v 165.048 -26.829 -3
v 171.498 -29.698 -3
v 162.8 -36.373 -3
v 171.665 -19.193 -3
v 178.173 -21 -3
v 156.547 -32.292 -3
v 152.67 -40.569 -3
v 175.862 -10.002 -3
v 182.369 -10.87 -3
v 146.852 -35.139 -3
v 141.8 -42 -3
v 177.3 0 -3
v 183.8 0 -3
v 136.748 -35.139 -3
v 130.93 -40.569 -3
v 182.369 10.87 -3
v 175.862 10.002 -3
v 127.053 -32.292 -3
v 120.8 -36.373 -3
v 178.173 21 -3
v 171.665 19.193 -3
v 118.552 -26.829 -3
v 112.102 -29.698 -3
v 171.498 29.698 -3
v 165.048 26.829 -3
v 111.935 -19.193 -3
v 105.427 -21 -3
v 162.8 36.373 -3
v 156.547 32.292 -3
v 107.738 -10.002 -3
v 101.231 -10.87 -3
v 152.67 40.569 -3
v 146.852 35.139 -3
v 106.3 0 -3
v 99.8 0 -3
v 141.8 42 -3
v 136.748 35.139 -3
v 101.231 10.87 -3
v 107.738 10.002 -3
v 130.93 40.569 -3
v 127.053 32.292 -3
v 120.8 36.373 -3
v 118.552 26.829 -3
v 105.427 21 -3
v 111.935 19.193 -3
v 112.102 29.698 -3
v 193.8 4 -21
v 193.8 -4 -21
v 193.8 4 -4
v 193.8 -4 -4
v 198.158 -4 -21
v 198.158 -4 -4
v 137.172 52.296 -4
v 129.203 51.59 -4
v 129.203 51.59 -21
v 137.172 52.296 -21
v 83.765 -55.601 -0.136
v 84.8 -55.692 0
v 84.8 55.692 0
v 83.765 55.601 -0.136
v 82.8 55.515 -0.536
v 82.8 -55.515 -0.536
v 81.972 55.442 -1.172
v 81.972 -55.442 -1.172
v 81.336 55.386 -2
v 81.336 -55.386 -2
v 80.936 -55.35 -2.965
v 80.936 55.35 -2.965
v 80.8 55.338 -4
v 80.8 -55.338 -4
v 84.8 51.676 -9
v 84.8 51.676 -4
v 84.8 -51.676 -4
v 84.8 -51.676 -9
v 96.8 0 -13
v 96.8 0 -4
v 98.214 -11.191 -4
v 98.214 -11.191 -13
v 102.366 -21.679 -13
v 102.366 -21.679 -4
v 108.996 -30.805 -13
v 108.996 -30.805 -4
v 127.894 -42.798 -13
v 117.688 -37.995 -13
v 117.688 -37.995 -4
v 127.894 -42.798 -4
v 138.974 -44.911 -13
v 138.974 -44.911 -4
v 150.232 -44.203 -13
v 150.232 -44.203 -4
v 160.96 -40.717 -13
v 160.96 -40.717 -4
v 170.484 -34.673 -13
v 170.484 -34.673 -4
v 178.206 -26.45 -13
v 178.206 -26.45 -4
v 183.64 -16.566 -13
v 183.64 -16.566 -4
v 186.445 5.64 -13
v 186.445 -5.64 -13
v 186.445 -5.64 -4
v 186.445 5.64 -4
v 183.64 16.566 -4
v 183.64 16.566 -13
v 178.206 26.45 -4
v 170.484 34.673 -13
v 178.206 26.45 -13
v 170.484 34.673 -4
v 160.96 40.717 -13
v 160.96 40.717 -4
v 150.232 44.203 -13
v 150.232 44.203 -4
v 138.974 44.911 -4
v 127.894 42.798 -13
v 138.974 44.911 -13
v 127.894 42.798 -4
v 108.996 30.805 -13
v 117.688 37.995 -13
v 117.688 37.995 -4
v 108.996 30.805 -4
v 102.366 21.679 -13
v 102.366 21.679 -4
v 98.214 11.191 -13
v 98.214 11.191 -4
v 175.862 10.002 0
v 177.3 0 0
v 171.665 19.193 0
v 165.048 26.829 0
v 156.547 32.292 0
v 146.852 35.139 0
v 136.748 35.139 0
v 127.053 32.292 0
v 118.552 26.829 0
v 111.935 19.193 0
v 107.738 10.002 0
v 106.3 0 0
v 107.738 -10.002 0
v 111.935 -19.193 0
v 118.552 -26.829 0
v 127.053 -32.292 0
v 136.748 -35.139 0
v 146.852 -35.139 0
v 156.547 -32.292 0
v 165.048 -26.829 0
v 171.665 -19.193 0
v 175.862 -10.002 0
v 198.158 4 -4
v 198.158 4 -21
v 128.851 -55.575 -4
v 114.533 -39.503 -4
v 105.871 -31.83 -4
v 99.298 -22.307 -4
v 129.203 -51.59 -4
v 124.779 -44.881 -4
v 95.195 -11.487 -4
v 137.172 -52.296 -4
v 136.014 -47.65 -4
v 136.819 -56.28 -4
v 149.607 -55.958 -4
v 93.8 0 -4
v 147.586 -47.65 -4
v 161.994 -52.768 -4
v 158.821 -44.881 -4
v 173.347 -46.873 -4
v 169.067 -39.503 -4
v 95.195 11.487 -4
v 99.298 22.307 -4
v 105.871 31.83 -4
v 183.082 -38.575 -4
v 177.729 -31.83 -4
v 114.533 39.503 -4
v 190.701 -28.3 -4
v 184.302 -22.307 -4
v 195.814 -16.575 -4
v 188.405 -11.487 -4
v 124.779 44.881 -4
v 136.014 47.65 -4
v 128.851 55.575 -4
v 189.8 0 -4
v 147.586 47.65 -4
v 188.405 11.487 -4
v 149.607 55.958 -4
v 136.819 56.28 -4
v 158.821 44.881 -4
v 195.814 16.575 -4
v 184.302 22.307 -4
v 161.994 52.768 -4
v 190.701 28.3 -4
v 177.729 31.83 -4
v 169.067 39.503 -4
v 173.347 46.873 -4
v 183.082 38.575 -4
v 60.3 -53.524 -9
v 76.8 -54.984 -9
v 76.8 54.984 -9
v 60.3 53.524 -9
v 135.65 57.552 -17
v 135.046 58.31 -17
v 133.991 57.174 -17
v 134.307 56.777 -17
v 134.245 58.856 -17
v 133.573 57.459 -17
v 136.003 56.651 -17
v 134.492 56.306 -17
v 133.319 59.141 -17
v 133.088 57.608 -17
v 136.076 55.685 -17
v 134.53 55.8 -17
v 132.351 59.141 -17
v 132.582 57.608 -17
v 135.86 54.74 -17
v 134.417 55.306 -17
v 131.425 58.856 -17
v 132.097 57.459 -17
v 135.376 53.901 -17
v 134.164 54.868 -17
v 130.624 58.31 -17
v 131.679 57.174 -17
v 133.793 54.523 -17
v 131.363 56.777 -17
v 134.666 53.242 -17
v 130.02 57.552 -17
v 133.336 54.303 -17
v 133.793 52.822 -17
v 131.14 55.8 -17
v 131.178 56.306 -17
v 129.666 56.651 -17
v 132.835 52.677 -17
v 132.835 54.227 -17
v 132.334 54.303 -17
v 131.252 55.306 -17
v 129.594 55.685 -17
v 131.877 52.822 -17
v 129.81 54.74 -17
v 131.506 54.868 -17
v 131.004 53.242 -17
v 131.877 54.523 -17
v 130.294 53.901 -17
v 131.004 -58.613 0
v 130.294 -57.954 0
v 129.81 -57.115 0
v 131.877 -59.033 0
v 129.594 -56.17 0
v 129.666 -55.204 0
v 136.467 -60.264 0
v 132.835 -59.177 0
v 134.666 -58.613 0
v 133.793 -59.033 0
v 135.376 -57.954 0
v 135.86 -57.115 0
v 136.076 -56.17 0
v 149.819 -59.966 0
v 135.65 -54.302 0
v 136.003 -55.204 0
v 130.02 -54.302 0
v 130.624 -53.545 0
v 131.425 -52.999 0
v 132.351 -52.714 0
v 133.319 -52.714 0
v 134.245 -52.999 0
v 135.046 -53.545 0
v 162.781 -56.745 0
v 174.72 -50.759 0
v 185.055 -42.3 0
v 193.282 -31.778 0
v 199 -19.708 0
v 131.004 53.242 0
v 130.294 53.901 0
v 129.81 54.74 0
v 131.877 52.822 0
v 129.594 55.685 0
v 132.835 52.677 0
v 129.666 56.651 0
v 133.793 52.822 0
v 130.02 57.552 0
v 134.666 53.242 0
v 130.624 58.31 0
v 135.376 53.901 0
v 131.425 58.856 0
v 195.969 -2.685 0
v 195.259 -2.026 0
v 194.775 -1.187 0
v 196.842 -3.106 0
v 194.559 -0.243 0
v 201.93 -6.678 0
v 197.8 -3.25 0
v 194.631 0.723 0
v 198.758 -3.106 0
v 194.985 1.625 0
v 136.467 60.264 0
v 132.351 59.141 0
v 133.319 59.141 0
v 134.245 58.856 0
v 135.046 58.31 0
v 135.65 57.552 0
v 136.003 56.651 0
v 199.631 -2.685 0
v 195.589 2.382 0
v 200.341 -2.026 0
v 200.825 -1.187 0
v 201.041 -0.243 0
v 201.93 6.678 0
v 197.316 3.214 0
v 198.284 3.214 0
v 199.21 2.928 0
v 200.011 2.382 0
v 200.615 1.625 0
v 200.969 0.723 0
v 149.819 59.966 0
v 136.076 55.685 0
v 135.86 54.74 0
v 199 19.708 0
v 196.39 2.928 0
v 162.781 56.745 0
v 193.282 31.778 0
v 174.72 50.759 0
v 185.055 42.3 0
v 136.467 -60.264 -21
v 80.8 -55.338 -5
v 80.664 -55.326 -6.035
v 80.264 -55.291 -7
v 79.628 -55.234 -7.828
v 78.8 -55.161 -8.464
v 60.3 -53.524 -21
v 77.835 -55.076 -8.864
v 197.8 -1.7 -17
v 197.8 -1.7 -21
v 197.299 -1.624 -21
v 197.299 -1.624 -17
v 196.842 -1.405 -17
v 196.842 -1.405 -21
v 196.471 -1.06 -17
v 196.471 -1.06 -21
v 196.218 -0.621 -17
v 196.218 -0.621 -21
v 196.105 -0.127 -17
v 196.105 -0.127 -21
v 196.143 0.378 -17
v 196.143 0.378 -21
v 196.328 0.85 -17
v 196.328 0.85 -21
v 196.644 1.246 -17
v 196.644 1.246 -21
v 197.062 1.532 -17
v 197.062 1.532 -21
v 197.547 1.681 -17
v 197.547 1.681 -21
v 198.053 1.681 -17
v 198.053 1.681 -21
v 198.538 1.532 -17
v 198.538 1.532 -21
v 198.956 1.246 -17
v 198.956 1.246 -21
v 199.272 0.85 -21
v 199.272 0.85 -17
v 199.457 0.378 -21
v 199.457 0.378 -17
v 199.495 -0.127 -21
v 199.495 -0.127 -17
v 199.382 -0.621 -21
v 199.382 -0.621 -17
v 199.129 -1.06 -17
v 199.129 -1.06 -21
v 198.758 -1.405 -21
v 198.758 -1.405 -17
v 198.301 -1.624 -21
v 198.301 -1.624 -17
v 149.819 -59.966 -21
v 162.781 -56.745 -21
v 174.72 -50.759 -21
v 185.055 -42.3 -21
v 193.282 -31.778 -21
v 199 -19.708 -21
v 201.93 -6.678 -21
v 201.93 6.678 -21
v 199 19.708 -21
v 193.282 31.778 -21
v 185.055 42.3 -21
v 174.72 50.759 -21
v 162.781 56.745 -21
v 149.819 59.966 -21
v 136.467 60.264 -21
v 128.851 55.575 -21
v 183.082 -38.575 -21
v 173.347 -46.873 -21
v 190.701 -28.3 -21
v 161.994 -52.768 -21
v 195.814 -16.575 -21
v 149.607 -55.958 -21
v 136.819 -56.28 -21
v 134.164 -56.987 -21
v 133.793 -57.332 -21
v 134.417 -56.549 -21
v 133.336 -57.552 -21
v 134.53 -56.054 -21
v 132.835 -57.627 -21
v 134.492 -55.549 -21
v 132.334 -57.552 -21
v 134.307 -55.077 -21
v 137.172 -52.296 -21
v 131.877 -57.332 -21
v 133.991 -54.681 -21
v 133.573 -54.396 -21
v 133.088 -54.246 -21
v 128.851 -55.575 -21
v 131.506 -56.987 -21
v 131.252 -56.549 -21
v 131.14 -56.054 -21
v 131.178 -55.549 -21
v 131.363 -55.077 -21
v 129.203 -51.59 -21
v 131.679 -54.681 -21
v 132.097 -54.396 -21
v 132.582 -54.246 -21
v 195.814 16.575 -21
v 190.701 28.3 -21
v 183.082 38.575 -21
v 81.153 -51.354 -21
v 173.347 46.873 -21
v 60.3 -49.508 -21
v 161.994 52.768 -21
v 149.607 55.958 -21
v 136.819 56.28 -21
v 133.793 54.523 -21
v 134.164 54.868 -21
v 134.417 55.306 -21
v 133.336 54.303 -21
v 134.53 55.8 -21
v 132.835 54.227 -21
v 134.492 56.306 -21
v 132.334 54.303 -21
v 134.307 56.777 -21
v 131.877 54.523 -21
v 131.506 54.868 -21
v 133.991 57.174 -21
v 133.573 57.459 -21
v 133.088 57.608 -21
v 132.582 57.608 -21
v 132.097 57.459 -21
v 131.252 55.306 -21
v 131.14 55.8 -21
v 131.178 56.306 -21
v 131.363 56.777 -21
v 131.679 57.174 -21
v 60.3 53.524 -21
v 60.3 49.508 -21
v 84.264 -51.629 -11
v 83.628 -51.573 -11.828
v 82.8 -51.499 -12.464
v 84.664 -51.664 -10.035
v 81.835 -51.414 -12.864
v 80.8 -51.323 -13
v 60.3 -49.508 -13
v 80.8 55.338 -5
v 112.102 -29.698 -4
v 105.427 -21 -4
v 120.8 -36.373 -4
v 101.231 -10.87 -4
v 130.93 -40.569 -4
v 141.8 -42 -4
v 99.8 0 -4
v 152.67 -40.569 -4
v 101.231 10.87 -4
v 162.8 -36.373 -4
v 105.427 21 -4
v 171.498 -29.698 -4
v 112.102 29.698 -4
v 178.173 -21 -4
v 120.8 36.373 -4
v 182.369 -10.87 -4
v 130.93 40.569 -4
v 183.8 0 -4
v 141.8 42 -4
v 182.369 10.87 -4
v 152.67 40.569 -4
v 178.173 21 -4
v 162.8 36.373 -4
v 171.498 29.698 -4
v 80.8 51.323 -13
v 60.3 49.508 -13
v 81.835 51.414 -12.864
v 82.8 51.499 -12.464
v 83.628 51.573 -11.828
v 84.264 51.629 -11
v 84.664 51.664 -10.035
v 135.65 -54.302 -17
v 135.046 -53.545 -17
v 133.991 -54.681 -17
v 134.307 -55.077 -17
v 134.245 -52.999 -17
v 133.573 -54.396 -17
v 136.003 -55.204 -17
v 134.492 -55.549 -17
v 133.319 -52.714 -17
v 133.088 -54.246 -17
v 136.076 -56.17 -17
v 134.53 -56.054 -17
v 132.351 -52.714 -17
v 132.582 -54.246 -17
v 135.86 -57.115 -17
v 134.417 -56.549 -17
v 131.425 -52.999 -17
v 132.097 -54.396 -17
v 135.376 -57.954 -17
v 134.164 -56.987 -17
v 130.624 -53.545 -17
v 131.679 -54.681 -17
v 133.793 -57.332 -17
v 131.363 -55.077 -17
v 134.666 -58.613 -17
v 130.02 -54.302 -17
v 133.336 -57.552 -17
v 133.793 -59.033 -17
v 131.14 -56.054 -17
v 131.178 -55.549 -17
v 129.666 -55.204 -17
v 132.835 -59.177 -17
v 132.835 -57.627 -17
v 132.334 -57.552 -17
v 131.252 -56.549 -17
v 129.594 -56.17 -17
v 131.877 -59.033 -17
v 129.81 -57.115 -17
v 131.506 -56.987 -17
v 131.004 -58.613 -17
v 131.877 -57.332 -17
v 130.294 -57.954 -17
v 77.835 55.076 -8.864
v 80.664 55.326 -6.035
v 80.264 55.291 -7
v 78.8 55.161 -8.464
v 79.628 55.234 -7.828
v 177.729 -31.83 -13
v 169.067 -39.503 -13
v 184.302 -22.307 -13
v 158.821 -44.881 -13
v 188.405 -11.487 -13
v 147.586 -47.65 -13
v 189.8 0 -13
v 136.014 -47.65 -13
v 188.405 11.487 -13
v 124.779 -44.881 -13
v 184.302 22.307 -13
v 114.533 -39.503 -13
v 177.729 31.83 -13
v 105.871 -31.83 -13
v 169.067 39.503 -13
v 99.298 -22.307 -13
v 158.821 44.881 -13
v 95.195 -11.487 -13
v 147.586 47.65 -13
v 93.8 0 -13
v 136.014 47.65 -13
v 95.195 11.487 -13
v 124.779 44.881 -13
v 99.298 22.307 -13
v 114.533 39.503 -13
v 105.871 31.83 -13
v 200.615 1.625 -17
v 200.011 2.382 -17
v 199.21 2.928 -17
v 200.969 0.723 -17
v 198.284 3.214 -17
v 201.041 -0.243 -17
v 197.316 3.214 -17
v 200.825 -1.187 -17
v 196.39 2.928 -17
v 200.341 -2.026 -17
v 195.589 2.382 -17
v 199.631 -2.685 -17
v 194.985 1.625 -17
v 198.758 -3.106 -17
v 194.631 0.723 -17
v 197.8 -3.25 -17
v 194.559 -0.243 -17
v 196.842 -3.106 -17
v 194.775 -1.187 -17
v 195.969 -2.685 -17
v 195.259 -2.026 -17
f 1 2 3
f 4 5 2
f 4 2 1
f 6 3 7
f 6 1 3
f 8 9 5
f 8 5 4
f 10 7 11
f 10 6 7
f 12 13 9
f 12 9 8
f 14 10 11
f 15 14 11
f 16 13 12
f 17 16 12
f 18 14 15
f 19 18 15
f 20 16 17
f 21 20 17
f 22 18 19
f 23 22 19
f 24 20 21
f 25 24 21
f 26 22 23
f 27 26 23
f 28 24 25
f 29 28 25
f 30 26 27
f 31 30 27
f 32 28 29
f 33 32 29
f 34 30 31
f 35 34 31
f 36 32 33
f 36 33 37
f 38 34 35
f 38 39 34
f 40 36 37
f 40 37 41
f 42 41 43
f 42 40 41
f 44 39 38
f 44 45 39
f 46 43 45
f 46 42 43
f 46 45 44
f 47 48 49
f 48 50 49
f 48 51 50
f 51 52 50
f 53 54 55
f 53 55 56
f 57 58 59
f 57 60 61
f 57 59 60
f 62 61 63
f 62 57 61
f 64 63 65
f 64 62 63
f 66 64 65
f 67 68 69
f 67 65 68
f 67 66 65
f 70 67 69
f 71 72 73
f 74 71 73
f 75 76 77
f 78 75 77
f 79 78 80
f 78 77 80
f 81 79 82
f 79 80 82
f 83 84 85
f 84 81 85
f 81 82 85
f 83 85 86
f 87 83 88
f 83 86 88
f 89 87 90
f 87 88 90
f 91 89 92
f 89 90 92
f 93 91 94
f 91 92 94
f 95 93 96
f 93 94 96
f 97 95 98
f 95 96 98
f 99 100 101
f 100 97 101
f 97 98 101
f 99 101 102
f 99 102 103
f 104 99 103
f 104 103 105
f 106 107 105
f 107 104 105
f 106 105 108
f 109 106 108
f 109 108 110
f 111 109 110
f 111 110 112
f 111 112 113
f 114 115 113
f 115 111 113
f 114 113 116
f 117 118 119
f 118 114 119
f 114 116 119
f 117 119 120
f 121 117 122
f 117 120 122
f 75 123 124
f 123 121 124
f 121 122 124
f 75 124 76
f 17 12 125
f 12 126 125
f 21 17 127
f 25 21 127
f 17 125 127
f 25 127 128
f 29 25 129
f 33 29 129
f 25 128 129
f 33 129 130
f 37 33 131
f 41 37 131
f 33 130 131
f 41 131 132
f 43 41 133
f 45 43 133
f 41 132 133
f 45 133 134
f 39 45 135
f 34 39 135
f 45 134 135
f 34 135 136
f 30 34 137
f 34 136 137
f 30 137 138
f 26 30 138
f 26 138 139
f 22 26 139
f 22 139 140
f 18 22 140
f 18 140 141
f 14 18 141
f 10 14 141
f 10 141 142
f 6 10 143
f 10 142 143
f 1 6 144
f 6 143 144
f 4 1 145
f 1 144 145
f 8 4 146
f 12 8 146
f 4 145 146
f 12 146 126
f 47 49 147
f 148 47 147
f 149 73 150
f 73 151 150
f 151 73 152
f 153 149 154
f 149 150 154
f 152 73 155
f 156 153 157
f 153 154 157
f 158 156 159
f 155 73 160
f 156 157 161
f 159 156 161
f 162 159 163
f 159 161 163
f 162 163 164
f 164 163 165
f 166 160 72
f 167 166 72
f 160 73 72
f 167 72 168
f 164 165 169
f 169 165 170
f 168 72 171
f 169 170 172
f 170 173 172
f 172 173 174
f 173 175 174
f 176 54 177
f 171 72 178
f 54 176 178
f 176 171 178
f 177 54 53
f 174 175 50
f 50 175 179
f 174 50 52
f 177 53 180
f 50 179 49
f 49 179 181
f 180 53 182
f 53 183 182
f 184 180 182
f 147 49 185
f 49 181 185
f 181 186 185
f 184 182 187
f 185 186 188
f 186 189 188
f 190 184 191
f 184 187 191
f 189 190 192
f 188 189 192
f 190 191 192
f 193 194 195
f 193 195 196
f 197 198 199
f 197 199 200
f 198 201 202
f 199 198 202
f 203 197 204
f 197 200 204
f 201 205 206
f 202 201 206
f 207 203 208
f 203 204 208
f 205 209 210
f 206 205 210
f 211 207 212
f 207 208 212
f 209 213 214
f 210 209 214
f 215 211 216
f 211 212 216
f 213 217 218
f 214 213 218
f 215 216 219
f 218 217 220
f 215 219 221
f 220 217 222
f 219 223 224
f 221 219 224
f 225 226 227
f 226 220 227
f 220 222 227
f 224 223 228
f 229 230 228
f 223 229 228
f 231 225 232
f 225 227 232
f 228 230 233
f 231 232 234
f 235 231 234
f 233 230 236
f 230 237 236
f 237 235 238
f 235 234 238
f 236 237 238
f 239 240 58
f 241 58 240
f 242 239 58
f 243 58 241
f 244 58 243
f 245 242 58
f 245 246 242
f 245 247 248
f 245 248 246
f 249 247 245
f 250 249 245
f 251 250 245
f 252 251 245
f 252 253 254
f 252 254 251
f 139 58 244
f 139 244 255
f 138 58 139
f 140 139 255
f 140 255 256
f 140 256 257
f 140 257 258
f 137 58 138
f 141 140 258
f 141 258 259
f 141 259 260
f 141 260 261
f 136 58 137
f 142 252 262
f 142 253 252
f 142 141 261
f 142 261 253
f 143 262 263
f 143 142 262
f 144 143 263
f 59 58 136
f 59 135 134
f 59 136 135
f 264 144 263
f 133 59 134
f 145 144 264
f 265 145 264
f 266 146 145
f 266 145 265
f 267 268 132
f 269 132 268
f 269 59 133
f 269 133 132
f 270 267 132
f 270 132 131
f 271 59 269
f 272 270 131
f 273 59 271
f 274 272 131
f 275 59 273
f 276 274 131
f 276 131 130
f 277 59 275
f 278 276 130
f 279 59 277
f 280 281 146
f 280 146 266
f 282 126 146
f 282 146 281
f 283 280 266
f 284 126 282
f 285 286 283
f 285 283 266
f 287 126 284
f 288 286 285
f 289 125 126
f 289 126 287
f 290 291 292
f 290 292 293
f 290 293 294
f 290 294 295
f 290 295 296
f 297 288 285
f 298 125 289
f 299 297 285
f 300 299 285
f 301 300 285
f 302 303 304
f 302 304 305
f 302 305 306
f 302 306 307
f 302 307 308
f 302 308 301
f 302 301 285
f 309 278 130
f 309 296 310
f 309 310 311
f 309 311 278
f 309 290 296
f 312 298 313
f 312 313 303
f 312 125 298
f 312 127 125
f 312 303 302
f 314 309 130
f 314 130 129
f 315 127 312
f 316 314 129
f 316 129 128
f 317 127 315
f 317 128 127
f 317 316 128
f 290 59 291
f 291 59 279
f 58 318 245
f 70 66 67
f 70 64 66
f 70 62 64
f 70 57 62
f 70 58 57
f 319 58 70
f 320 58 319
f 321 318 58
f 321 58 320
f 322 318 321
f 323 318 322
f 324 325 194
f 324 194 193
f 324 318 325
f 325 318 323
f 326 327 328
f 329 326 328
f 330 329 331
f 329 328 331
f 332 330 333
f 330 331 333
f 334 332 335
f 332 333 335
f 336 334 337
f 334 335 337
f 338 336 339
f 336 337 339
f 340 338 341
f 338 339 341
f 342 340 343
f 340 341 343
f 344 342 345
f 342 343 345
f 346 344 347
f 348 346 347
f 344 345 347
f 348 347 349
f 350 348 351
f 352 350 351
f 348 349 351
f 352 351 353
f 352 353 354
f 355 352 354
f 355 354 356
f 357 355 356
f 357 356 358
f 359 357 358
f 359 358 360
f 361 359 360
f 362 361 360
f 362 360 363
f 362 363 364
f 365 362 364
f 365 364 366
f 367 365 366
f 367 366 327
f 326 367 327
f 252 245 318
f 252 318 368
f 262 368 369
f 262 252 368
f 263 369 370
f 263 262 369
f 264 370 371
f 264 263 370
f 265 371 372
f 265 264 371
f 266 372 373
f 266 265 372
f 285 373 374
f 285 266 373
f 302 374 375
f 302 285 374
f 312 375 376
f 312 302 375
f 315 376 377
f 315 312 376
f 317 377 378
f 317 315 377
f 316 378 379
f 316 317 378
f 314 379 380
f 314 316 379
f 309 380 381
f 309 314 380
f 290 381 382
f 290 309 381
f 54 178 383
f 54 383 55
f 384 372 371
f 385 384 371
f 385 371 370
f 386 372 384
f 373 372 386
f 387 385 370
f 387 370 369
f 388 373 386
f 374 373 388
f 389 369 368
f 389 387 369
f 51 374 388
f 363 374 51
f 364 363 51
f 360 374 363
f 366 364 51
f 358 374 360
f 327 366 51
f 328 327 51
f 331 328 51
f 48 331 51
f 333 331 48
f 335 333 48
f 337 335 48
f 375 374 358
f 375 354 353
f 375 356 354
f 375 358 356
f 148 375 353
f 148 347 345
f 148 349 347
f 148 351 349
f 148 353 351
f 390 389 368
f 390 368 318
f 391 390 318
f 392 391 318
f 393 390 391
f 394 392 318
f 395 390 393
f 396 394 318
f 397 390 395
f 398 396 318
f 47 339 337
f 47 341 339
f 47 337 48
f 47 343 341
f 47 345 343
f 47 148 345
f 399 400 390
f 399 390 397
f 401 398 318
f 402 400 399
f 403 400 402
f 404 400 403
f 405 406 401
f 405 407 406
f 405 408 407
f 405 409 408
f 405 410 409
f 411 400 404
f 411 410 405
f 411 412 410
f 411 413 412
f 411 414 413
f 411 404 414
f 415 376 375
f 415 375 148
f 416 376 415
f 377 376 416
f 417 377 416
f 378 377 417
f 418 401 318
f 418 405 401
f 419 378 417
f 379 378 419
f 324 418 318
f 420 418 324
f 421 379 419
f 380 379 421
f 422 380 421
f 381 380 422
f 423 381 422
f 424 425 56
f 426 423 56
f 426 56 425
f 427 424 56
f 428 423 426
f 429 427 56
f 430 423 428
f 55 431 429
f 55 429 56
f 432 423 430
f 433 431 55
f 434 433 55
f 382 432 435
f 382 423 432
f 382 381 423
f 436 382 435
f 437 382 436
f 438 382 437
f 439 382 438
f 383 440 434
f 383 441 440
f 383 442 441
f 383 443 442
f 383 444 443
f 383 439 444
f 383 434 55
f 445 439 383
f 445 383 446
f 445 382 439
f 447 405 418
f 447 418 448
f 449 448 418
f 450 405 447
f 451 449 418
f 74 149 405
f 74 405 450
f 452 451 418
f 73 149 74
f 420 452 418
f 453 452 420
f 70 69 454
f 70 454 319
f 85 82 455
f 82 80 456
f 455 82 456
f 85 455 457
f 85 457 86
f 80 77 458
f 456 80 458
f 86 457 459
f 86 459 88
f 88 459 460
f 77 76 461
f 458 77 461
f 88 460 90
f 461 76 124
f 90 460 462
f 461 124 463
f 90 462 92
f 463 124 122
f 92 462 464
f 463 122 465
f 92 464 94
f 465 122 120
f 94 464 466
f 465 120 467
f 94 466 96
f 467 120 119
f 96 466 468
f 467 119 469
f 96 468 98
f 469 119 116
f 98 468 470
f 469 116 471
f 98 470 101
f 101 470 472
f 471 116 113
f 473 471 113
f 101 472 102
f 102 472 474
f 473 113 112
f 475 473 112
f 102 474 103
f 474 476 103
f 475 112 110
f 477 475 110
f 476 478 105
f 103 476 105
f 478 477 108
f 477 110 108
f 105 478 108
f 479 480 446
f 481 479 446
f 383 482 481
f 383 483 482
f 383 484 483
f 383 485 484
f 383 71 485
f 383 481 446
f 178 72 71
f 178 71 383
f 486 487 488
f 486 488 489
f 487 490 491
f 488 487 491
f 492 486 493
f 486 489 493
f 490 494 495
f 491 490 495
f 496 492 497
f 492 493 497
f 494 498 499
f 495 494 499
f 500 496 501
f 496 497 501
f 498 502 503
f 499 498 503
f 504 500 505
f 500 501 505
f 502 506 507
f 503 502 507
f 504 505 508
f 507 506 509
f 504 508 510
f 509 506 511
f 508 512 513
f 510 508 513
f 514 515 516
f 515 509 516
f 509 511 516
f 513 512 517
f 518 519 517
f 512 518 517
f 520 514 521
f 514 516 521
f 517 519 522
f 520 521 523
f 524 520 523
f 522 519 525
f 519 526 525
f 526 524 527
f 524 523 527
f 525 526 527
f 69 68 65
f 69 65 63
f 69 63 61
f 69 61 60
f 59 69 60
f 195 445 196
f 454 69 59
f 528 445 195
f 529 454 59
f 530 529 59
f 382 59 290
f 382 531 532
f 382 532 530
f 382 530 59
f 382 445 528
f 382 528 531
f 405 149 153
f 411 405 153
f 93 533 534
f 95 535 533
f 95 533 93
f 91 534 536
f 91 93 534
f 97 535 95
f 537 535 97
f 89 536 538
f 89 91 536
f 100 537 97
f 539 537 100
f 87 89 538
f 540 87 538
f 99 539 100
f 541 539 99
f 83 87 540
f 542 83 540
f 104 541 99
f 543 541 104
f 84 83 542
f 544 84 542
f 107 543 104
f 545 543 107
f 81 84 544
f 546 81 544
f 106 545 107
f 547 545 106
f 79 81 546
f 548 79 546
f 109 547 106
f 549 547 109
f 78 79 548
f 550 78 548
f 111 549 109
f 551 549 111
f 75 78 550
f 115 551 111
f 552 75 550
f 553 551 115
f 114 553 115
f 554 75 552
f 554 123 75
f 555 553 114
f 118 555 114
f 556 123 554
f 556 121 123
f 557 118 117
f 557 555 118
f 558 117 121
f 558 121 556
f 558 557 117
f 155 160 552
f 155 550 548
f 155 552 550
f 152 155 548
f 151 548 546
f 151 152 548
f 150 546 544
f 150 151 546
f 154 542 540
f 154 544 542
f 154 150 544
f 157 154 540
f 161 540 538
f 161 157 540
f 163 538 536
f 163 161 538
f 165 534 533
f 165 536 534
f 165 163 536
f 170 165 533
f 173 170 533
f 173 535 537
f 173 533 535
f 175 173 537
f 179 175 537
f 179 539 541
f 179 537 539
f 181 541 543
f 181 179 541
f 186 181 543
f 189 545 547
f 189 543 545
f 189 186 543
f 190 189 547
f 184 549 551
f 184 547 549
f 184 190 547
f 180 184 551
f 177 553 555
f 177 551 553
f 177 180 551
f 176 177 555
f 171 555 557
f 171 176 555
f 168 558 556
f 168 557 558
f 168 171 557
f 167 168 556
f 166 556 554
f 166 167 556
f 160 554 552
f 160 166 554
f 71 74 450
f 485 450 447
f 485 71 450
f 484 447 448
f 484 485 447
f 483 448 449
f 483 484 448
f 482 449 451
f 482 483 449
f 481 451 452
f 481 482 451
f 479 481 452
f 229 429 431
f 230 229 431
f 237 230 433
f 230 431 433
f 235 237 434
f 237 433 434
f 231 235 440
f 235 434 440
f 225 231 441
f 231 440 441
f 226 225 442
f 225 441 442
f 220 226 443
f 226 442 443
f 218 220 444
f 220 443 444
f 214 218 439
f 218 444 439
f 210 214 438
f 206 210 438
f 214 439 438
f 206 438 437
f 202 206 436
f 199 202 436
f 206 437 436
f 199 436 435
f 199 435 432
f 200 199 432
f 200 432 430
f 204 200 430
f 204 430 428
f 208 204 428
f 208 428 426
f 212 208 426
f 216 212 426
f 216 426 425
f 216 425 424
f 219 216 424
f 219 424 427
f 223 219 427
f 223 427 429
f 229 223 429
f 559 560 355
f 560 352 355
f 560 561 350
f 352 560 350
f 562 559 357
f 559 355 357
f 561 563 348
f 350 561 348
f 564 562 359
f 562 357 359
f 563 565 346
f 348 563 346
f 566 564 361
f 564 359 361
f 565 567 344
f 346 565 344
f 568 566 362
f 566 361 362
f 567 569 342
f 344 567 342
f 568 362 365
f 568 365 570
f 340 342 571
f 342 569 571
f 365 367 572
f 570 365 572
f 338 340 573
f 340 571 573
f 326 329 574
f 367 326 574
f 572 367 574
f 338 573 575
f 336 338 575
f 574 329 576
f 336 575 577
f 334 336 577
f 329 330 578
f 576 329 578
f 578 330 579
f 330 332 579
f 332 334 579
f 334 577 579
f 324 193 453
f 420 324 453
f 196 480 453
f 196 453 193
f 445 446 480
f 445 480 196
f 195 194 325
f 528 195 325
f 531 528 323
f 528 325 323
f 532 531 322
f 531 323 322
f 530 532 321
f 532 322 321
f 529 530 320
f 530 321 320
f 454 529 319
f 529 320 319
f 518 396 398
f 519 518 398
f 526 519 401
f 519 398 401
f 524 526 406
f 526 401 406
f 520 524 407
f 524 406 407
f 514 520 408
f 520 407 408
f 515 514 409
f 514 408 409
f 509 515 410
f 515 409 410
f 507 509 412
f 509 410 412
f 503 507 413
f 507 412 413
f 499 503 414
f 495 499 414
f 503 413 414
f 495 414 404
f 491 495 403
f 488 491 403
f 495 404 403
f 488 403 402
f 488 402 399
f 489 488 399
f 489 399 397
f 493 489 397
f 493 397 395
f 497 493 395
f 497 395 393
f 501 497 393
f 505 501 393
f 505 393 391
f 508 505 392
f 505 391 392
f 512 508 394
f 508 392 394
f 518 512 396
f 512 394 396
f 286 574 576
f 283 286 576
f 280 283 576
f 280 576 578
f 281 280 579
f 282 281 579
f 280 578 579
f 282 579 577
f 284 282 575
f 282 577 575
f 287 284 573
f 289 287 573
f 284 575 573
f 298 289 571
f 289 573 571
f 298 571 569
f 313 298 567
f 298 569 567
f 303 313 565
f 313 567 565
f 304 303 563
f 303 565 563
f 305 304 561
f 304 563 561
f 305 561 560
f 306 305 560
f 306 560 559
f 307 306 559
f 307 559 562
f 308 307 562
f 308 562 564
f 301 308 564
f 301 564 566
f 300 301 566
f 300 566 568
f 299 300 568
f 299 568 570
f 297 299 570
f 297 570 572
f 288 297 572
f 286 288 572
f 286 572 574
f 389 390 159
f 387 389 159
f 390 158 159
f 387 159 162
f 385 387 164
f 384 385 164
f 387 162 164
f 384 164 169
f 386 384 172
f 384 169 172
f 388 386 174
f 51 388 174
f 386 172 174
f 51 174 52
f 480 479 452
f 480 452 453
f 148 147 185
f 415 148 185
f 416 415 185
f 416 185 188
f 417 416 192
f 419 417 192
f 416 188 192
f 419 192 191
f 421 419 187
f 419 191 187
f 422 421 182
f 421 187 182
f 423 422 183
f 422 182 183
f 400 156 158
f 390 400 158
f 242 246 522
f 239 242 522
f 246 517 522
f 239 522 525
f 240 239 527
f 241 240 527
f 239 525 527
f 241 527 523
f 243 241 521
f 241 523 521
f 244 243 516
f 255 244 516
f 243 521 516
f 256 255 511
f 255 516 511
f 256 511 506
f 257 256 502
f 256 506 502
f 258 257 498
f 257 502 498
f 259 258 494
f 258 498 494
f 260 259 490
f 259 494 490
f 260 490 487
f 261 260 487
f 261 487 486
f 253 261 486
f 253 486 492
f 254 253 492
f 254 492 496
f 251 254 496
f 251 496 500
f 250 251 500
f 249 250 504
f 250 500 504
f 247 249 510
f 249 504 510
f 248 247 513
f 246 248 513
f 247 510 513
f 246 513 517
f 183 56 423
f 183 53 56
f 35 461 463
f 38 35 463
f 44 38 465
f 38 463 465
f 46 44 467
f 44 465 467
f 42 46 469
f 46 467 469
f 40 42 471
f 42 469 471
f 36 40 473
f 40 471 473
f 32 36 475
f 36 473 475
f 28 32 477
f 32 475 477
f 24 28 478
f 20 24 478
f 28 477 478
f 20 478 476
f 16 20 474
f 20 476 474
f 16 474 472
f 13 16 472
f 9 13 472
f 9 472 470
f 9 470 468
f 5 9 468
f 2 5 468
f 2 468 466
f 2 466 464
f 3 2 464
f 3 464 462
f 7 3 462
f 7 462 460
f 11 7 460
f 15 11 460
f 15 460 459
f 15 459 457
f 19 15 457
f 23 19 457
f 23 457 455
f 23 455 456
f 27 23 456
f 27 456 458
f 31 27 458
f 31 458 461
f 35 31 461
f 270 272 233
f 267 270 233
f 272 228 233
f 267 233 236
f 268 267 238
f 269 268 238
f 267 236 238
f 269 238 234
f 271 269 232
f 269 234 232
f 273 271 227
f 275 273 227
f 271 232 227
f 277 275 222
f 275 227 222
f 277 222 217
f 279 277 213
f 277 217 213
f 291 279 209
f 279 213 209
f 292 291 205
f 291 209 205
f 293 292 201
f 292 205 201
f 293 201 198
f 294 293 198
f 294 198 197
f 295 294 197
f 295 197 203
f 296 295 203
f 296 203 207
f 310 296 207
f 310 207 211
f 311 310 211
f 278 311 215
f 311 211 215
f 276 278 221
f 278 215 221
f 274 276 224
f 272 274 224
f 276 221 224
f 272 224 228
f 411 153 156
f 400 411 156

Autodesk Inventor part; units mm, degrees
ref_plane "YZ Plane" through (0, 0, 0) normal (1, 0, 0) x (0, 1, 0)
ref_plane "XZ Plane" through (0, 0, 0) normal (0, 1, 0) x (-1, 0, 0)
ref_plane "XY Plane" through (0, 0, 0) normal (0, 0, 1) x (1, 0, 0)
sketch "Sketch1" plane through (0, 0, 0) normal (0, 0, 1) x (1, 0, 0)
  circle A0 centre (0, 0) radius 48
  circle A1 centre (141.8, 0) radius 60.5
  line L0 (136.466784, 60.264474) -> (-4.231312, 47.813136)
  line L1 (-4.231312, -47.813136) -> (136.466784, -60.264474)
  line L2 (80.8, 55.338139) -> (80.8, -55.338139)
  dimension "d0" = 96
  dimension "d1" = 121
  dimension "d2" = 141.8
  dimension "d3" = 61
extrude "Extrusion1" add sketch "Sketch1" against normal blind 21 contours L0 A1 L1 L2 | A1
sketch "Sketch2" plane through (0, 0, -21) normal (0, 0, -1) x (-1, 0, 0)
  line L0 (-80.8, -55.338139) -> (-60.3, -53.523954)
  line L1 (-60.3, -53.523954) -> (-60.3, 53.523954)
  line L2 (-60.3, 53.523954) -> (-80.8, 55.338139)
  line L3 (-80.8, 55.338139) -> (-80.8, -55.338139)
  line L4 (-136.466784, -60.264474) -> (-80.8, -55.338139)
  line L5 (-80.8, 55.338139) -> (-136.466784, 60.264474)
  line L6 (-80.8, -55.338139) -> (-80.8, 55.338139)
  point P0 (0, 0)
  dimension "d7" = 20.5
extrude "Extrusion2" add sketch "Sketch2" against normal blind 12
shell "Shell1" thickness 4 removed faces 1 at (111.077856, 17.841318, -21)
sketch "Sketch3" plane through (141.8, 0, -4) normal (0, 0, -1) x (-1, 0, 0)
  circle A0 centre (0, 0) radius 42
  point P0 (141.8, 0)
  dimension "d10" = 84
extrude "Extrusion3" cut sketch "Sketch3" against normal blind 1
sketch "Sketch4" plane through (0, 0, 0) normal (0, 0, 1) x (1, 0, 0)
  circle A0 centre (141.8, 0) radius 42 projected
  circle A1 centre (141.8, 0) radius 35.5
  point P0 (0, 0)
  dimension "d13" = 71
extrude "Extrusion4" cut sketch "Sketch4" against normal through all contours A1
sketch "Sketch5" plane through (141.8, 0, -4) normal (0, 0, -1) x (-1, 0, 0)
  circle A0 centre (0, 0) radius 45
  circle A1 centre (0, 0) radius 48
  point P0 (141.8, 0)
  dimension "d16" = 90
  dimension "d17" = 96
extrude "Extrusion5" add sketch "Sketch5" along normal blind 9
sketch "Sketch6" plane through (84.8, -51.676494, -13) normal (0, 0, -1) x (-1, 0, 0)
  line L0 (8.632076, 0.763912) -> (62.461619, 5.527656)
  line L1 (62.461619, 5.527656) -> (62.461619, 97.825331)
  line L2 (62.461619, 97.825331) -> (8.632076, 102.589076)
  line L3 (8.632076, 102.589076) -> (8.632076, 0.763912)
  line L4 (20.5, 1.814185) -> (-52.019394, -4.603552)
  line L5 (-52.019394, 107.956539) -> (20.5, 101.538802)
extrude "Extrusion6" cut sketch "Sketch6" along normal through all
fillet "Fillet1" radius 4 3 edges at (84.8, 0, -13) (80.8, 0, -9) (80.8, 0, 0)
sketch "Sketch7" plane through (141.8, 0, -4) normal (0, 0, -1) x (-1, 0, 0)
  line L0 (-52, 4) -> (-60, 4)
  line L1 (-60, 4) -> (-60, -4)
  line L2 (-60, -4) -> (-52, -4)
  line L3 (-52, -4) -> (-52, 4)
  line L4 (-52, 4) -> (-60, -4) construction
  line L5 (-60, 4) -> (-52, -4) construction
  arc A0 (4.980606, 56.280046) -> (4.980606, -56.280046) centre (0, 0) ccw
  line L6 (4.980606, -56.280046) -> (12.949463, -55.574827)
  line L7 (12.949463, -55.574827) -> (12.596853, -51.590399)
  line L8 (12.596853, -51.590399) -> (4.627997, -52.295618)
  line L9 (4.627997, -52.295618) -> (4.980606, -56.280046)
  line L10 (4.980606, 56.280046) -> (57, 51.676494)
  line L11 (4.980606, 56.280046) -> (12.949463, 55.574827)
  line L12 (12.949463, 55.574827) -> (12.596853, 51.590399)
  line L13 (12.596853, 51.590399) -> (4.627997, 52.295618)
  line L14 (4.627997, 52.295618) -> (4.980606, 56.280046)
  point P0 (141.8, 0)
  point P1 (-56, 0)
  dimension "d24" = 4
  dimension "d25" = 4
  dimension "d26" = 8
  dimension "d27" = 8
  dimension "d28" = 8
  dimension "d29" = 56
extrude "Extrusion7" add sketch "Sketch7" along normal up to surface (17 mm away)
sketch "Sketch8" plane through (0, 0, 0) normal (0, 0, -1) x (-1, 0, 0)
  line L0 (-60.3, -49.508321) -> (-128.850537, -55.574827)
  line L1 (-128.850537, 55.574827) -> (-60.3, 49.508321)
  circle A0 centre (-141.8, 0) radius 35.5
  line L2 (-128.850537, -55.574827) -> (-129.203147, -51.590399)
  line L3 (-129.203147, 51.590399) -> (-128.850537, 55.574827)
  point P0 (0, 0)
  point P1 (-197.8, 0)
  point P2 (-132.834965, -55.927437)
  point P3 (-132.834965, 55.927437)
  dimension "d32" = 56
  dimension "d33" = 4
  dimension "d34" = 4
hole "Hole1" at (197.8, 0, 0) at (132.834965, -55.927437, 0) at (132.834965, 55.927437, 0) direction (0, 0, -1) diameter 3.4 end through all counterbore diameter 6.5 counterbore depth 17 clearance for "Socket Head Cap Screw DIN EN ISO 4762" size "M3" standard "DIN"
sketch "Sketch9" plane through (0, 0, 0) normal (0, 0, 1) x (1, 0, 0)
  circle A0 centre (125.937089, 54.374793) radius 1.7
  circle A1 centre (132.834965, -55.927437) radius 1.7
  circle A2 centre (197.8, 0) radius 1.7
  point P0 (0, 0)
equation "\"d25\" = d24"
equation "\"d27\" = d26"
equation "\"d28\" = d26"
properties part number "J1-sketch"
